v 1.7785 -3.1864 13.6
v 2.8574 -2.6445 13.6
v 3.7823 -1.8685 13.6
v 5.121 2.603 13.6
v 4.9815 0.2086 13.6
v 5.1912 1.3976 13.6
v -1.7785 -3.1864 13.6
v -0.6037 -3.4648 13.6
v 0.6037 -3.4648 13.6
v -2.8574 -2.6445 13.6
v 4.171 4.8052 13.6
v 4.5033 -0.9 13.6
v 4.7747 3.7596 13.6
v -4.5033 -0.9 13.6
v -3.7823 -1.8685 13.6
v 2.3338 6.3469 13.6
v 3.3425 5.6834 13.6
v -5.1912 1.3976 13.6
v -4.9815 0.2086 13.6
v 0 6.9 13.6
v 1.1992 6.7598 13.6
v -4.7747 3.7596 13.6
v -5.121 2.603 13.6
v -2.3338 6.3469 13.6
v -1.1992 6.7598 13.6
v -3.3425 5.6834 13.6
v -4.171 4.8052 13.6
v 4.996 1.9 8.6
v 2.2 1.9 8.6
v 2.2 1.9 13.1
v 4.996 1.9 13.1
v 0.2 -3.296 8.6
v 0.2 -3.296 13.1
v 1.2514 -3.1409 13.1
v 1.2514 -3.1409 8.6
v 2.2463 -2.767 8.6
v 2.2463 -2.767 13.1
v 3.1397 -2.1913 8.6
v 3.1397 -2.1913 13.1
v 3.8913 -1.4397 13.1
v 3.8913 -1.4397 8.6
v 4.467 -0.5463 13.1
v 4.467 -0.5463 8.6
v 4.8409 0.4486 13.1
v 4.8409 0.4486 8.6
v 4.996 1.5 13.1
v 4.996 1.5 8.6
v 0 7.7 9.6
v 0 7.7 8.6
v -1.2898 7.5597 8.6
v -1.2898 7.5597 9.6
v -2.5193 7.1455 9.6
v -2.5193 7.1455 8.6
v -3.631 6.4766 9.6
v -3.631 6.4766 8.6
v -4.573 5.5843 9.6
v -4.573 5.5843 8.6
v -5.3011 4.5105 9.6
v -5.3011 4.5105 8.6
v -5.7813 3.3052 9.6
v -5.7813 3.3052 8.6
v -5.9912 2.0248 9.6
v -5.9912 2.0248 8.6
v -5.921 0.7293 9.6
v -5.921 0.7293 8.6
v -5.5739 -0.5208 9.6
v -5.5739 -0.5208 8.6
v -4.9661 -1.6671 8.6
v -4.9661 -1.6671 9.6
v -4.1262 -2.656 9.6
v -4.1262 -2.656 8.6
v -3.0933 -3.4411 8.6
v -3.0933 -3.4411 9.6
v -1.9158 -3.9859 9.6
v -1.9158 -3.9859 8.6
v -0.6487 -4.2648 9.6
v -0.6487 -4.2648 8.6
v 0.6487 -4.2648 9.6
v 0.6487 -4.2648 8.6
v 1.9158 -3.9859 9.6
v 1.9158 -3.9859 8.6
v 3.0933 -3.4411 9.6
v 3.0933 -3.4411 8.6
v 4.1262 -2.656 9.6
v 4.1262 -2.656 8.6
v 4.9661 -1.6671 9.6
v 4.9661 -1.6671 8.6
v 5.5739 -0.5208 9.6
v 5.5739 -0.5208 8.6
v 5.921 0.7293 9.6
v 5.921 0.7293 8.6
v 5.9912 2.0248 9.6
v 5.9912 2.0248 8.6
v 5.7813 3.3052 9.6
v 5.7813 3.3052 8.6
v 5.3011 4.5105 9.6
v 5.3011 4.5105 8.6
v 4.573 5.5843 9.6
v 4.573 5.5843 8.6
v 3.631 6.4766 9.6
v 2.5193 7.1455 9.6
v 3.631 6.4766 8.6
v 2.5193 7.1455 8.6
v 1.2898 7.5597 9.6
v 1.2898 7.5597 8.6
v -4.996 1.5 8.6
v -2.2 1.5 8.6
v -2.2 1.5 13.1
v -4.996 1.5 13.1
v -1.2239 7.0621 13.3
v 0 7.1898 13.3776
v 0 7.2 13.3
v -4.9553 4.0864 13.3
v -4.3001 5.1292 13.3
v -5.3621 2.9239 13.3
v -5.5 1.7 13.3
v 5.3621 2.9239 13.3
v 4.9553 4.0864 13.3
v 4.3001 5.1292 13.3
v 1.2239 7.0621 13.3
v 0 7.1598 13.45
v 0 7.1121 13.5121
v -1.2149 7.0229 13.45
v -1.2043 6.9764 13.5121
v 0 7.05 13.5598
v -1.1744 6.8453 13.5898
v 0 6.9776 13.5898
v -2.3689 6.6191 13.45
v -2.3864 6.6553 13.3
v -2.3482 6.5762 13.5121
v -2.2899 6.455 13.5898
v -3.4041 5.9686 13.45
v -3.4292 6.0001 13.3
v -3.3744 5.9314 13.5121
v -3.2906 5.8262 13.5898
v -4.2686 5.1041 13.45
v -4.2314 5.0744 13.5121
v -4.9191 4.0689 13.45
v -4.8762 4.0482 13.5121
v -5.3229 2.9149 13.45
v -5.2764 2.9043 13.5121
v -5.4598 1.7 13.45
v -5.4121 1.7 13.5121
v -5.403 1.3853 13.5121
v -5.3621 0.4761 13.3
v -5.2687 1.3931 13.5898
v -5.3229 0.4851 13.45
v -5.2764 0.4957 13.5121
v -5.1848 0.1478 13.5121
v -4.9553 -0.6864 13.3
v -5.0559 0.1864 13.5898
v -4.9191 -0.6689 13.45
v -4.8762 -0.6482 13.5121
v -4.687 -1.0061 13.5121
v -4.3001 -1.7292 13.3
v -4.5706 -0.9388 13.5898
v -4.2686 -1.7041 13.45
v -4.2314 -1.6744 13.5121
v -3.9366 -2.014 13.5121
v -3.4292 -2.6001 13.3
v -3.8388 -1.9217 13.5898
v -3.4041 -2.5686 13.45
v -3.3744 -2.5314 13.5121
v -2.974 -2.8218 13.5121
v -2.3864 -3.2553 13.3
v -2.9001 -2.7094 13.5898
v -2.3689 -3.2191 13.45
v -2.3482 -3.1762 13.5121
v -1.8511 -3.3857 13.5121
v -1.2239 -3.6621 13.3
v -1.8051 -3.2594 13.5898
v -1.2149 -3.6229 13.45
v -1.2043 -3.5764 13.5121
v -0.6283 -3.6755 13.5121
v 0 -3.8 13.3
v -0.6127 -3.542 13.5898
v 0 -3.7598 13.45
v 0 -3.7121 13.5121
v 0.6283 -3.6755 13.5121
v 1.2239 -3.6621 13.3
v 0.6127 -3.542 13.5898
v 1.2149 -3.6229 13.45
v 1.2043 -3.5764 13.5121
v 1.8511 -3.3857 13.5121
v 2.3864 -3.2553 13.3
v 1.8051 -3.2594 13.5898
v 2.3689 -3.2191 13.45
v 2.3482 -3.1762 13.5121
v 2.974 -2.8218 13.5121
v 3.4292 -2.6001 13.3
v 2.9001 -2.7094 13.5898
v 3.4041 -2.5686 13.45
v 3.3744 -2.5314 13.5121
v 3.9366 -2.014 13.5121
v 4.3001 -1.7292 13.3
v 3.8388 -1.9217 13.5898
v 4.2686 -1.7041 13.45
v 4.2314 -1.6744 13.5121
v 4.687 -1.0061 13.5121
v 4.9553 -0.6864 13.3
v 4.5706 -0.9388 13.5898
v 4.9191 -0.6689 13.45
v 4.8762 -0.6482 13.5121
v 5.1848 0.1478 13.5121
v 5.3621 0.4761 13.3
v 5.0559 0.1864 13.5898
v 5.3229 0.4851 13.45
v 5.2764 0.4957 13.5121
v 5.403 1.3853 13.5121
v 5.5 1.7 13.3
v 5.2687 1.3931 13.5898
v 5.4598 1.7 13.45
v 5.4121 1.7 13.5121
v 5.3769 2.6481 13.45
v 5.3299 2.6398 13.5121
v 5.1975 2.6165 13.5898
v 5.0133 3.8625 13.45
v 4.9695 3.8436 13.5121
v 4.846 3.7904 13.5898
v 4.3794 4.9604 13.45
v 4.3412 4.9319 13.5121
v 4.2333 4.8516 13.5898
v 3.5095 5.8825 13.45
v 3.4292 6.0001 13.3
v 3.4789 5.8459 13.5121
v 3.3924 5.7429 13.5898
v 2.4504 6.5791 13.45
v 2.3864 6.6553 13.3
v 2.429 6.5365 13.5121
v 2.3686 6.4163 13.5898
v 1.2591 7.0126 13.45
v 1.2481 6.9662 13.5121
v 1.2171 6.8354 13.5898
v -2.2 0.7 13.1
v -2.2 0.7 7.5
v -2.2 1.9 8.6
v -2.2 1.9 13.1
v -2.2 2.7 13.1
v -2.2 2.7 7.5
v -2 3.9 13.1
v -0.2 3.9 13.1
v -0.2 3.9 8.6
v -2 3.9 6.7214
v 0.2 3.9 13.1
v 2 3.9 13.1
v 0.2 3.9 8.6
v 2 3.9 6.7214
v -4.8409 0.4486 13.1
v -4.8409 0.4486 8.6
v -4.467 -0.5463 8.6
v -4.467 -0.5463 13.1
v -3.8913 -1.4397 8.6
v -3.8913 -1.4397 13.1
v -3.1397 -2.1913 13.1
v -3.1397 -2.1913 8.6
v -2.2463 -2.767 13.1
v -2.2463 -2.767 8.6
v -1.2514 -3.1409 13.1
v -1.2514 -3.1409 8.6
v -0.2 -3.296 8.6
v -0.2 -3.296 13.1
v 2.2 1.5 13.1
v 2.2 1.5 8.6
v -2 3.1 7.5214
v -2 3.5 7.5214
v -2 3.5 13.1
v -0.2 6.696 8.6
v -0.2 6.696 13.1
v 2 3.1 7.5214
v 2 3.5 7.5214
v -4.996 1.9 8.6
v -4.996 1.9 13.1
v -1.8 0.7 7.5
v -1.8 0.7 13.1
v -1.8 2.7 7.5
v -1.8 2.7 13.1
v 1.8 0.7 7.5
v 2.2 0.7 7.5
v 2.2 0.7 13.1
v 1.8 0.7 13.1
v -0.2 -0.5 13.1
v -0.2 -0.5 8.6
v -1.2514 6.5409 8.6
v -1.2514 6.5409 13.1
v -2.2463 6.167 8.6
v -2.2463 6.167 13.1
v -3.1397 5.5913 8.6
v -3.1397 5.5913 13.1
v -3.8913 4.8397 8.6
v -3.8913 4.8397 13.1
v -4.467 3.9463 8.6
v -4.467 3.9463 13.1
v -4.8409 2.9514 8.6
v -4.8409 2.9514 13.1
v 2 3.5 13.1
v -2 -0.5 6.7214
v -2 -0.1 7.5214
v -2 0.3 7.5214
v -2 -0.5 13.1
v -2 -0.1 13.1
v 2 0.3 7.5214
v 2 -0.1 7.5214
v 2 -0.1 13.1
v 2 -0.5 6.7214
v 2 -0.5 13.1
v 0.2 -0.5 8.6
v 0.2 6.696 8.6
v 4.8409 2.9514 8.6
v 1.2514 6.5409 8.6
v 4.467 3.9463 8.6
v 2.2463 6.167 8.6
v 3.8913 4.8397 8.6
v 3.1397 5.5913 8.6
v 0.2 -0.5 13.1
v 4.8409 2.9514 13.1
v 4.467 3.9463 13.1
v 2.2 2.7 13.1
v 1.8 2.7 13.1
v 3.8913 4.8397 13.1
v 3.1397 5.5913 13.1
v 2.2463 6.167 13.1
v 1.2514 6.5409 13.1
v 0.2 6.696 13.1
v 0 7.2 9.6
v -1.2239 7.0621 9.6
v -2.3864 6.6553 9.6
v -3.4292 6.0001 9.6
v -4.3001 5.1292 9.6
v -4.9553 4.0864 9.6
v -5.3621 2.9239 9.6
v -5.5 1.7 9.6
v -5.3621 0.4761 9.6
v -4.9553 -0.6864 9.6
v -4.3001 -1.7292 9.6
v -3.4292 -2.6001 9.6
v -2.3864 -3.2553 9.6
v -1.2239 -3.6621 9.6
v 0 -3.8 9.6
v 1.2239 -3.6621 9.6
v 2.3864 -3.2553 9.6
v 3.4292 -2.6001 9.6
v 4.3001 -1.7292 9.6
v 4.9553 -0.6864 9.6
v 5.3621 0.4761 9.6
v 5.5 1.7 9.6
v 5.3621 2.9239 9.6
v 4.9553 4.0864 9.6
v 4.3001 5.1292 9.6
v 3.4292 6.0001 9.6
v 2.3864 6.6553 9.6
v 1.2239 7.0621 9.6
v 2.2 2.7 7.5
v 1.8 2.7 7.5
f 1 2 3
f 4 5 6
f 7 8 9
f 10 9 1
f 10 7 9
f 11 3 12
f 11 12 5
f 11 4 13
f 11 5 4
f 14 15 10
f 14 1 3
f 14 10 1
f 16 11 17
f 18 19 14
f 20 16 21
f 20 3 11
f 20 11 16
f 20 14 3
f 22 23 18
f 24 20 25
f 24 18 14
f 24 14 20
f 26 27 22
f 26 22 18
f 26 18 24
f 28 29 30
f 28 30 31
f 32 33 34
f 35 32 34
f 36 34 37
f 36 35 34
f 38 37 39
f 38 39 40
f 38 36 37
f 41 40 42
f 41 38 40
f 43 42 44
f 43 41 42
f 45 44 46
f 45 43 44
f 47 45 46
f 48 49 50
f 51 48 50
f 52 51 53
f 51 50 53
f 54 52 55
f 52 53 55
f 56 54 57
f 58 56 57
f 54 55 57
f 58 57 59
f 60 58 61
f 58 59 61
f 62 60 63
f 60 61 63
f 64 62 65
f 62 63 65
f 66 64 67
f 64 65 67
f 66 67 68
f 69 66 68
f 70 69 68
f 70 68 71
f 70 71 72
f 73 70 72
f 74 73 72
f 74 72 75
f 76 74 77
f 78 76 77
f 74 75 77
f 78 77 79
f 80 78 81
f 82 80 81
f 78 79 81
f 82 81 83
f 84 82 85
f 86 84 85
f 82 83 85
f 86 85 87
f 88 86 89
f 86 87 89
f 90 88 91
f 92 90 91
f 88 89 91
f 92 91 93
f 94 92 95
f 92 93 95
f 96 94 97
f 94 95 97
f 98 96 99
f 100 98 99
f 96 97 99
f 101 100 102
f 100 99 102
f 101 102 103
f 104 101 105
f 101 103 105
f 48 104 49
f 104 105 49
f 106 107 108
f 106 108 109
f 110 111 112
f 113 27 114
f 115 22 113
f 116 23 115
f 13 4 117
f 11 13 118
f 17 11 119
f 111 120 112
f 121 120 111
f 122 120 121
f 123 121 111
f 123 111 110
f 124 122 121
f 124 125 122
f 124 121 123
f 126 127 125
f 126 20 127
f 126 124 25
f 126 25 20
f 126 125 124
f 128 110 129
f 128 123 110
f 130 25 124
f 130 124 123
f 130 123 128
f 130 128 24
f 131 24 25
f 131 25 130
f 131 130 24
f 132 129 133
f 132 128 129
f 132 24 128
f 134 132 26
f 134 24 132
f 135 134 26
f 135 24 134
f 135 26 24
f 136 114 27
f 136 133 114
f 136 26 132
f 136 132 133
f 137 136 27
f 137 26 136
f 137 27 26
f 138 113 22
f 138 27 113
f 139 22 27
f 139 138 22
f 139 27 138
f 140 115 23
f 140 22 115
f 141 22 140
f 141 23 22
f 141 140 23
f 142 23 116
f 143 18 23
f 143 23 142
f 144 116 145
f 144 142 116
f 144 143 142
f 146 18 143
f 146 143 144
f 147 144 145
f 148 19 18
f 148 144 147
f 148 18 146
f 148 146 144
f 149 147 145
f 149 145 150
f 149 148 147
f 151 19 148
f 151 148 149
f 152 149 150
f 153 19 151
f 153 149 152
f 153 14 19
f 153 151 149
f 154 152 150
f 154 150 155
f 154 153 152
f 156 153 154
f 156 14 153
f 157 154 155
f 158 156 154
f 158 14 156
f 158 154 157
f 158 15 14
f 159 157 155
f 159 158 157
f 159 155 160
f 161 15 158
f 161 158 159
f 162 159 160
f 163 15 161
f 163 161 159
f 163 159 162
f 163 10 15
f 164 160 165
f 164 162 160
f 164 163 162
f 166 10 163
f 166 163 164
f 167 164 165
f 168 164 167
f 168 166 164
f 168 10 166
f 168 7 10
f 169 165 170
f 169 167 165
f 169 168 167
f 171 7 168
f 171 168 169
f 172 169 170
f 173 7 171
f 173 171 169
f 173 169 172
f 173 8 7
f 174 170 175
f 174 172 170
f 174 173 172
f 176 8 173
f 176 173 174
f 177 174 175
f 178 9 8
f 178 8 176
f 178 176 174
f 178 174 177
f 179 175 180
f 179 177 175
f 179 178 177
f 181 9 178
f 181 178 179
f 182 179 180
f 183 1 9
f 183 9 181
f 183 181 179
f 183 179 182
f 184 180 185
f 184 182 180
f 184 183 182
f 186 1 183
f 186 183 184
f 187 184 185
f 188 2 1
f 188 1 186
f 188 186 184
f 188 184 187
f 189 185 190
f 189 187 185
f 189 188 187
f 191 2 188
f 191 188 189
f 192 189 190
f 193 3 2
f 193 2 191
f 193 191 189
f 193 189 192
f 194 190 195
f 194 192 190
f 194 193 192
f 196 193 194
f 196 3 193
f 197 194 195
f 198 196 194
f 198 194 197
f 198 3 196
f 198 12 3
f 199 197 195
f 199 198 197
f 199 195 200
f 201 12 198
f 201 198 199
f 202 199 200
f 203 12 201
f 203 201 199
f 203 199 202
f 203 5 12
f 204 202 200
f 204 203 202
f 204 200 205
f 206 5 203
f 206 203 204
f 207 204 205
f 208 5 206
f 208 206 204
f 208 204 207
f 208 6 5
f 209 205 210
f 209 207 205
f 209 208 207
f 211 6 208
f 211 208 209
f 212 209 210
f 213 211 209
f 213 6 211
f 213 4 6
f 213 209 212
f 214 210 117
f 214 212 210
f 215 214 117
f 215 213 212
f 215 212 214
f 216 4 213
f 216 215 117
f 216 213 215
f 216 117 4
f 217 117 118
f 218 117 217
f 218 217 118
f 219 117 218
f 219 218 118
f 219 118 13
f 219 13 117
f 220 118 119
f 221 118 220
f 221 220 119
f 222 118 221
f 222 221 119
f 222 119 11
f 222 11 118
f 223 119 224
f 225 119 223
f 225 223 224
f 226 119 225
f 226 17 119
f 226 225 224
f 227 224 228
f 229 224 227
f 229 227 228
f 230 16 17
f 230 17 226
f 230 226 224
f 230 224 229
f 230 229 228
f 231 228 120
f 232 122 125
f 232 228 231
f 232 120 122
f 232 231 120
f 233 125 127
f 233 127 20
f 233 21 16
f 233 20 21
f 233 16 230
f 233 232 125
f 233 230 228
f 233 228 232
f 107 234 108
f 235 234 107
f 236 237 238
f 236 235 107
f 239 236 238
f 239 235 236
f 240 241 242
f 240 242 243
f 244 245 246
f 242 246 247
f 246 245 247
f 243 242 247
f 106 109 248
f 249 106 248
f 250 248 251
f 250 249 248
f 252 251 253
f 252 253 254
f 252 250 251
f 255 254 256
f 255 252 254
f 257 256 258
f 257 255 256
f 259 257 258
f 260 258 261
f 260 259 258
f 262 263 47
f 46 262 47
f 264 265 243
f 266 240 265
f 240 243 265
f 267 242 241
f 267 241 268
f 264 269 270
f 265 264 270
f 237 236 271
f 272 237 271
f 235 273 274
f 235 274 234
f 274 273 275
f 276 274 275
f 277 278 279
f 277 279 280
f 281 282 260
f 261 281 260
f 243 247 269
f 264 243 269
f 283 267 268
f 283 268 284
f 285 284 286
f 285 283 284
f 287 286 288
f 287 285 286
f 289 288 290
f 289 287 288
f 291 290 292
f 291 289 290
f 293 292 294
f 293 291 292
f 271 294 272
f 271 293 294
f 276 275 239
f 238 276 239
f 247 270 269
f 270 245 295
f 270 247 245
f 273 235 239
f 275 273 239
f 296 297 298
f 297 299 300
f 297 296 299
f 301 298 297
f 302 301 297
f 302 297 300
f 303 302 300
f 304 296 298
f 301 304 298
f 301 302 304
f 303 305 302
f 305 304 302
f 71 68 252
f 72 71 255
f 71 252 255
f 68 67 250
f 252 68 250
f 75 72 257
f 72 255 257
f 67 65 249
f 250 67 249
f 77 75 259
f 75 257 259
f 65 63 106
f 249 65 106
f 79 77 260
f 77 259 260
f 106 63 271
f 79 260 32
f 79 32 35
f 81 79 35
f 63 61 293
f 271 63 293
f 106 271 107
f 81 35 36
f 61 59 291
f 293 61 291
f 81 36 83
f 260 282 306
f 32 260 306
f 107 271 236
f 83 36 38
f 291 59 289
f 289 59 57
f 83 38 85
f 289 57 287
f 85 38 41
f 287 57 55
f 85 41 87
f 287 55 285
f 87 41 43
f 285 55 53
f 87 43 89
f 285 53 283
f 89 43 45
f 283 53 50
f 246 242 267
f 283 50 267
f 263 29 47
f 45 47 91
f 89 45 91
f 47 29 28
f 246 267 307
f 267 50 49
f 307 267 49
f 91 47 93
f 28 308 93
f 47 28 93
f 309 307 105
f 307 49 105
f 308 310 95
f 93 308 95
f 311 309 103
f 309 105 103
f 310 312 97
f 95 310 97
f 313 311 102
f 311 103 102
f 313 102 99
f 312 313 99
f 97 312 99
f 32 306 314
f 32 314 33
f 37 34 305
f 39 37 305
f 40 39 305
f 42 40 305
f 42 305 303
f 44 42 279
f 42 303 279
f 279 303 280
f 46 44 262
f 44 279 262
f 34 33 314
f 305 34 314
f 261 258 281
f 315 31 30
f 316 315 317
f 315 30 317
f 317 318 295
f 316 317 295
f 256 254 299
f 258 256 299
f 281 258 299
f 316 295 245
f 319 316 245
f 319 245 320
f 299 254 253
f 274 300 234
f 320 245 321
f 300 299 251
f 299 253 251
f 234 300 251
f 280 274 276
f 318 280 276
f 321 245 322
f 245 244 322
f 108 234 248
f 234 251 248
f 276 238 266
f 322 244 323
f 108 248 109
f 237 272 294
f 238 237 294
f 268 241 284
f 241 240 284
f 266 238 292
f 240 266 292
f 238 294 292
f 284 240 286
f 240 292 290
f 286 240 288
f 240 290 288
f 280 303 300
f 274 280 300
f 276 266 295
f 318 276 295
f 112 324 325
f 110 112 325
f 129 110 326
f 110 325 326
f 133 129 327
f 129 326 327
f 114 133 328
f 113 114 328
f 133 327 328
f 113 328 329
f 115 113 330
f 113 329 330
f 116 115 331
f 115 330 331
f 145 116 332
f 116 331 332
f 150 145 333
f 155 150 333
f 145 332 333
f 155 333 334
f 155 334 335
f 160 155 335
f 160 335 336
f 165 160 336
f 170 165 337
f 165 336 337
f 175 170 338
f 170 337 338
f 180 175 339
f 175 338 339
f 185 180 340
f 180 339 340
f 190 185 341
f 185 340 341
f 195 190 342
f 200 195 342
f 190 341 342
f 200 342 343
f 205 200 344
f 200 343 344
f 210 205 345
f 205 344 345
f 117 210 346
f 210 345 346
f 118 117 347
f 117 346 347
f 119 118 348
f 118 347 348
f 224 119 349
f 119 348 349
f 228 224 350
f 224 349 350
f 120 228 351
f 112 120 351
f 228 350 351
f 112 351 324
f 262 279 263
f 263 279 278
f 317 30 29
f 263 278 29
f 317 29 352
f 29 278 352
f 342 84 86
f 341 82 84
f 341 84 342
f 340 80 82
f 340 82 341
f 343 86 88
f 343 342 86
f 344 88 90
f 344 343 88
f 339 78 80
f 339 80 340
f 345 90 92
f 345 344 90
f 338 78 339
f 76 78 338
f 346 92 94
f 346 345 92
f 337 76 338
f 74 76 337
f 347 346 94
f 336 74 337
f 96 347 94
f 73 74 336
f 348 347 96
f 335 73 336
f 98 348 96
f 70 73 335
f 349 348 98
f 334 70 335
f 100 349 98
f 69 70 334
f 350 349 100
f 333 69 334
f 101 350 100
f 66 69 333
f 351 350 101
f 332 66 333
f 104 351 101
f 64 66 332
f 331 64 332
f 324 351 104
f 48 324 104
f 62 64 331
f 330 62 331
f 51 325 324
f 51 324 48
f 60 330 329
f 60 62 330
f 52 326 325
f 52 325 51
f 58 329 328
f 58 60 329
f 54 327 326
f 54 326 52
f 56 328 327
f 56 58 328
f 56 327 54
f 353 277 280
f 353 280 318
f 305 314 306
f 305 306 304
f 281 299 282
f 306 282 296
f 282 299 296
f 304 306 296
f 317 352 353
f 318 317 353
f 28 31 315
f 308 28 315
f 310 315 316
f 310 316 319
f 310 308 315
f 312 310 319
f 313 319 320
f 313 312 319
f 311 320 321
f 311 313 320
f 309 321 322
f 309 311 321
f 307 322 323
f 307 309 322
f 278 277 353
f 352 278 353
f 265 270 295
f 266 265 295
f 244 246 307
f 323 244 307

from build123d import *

# Parameters (mm, degrees)
PAD004_DEPTH              = 4
BOX019_W                  = 2
BOX019_H                  = 0.4
BOX019_DEPTH              = 5.7
PAD003_DEPTH              = 4
BOX021_W                  = 2
BOX021_H                  = 0.4
BOX021_DEPTH              = 5.7
BOX020_W                  = 3
BOX020_H                  = 0.4
BOX020_DEPTH              = 4.5
ARRAY_COUNT               = 4
CYLINDER015_R             = 5
CYLINDER015_DEPTH         = 5
CYLINDER019_R             = 6
CYLINDER019_DEPTH         = 1
CYLINDER018_R             = 5.5
CYLINDER018_DEPTH         = 4
FILLET_R                  = 0.3
FUSION001_PLACEMENT_ANGLE = 90


with BuildPart() as pad004:
    # Sketch007 → Pad004 (new body)
    with BuildSketch(Plane(origin=(0.3, -2, 0), x_dir=(-1, 0, 0), z_dir=(0, 1, 0))):
        Polygon((-1.9, 4.62141), (-1.9, -1.87859), (-1.1, -1.07859), (-1.5, -1.07859), (-1.5, 4.62141), align=None)
    extrude(amount=PAD004_DEPTH)


with BuildPart() as cubo008:
    # Box019 → Box019 (new body)
    with BuildSketch(Plane(origin=(-1, -2.2, -1.1), x_dir=(1, 0, 0), z_dir=(0, 0, 1))):
        with Locations((1, 0.2)):
            Rectangle(BOX019_W, BOX019_H)
    extrude(amount=BOX019_DEPTH)


with BuildPart() as pad003:
    # Sketch008 → Pad003 (new body)
    with BuildSketch(Plane.XZ.offset(-2)):
        Polygon((-2.2, 4.62141), (-2.2, -1.87859), (-1.4, -1.07859), (-1.8, -1.07859), (-1.8, 4.62141), align=None)
    extrude(amount=PAD003_DEPTH)


with BuildPart() as cubo007:
    # Box021 → Box021 (new body)
    with BuildSketch(Plane(origin=(-1, 1.8, -1.1), x_dir=(1, 0, 0), z_dir=(0, 0, 1))):
        with Locations((1, 0.2)):
            Rectangle(BOX021_W, BOX021_H)
    extrude(amount=BOX021_DEPTH)


with BuildPart() as array:
    # Box020 → Box020 (new body)
    with BuildSketch(Plane(origin=(2.1, -0.2, 0), x_dir=(1, 0, 0), z_dir=(0, 0, 1))):
        with Locations((1.5, 0.2)):
            Rectangle(BOX020_W, BOX020_H)
    extrude(amount=BOX020_DEPTH)

    # Array: Array ×4 about axis
    array_axis = Axis((0, 0, 0), (0, 0, 1))


with BuildPart() as array_1:
    add(array.part)
    for i in range(1, ARRAY_COUNT):
        add(array.part.rotate(array_axis, i * 360 / ARRAY_COUNT))


with BuildPart() as cilindro018:
    # Cylinder015 → Cylinder015 (new body)
    with BuildSketch(Plane.XY.offset(-0.5)):
        Circle(CYLINDER015_R)
    extrude(amount=CYLINDER015_DEPTH)


with BuildPart() as cilindro017:
    # Cylinder019 → Cylinder019 (new body)
    with BuildSketch(Plane.XY):
        Circle(CYLINDER019_R)
    extrude(amount=CYLINDER019_DEPTH)


with BuildPart() as tapon:
    # Cylinder018 → Cylinder018 (new body)
    with BuildSketch(Plane.XY.offset(1)):
        Circle(CYLINDER018_R)
    extrude(amount=CYLINDER018_DEPTH)

    # Fusion002: union Cilindro017
    add(cilindro017.part)

    # Cut032: cut Cilindro018
    add(cilindro018.part, mode=Mode.SUBTRACT)

    # Fillet
    fillet_edges = [tapon.edges().sort_by_distance(p)[0] for p in [
        (-5.5, 0, 5),
    ]]
    fillet(fillet_edges, radius=FILLET_R)

    # Fusion001: union Pad004, Cubo008, Pad003, Cubo007, Array
    add(pad004.part)
    add(cubo008.part)
    add(pad003.part)
    add(cubo007.part)
    add(array_1.part)


with BuildPart() as tapon_1:
    # Fusion001 placement: moved
    add(tapon.part.moved(Location((0, 1.7, 8.6))).rotate(Axis((0, 1.7, 8.6), (0, 0, 1)), FUSION001_PLACEMENT_ANGLE))


solid = tapon_1.part
